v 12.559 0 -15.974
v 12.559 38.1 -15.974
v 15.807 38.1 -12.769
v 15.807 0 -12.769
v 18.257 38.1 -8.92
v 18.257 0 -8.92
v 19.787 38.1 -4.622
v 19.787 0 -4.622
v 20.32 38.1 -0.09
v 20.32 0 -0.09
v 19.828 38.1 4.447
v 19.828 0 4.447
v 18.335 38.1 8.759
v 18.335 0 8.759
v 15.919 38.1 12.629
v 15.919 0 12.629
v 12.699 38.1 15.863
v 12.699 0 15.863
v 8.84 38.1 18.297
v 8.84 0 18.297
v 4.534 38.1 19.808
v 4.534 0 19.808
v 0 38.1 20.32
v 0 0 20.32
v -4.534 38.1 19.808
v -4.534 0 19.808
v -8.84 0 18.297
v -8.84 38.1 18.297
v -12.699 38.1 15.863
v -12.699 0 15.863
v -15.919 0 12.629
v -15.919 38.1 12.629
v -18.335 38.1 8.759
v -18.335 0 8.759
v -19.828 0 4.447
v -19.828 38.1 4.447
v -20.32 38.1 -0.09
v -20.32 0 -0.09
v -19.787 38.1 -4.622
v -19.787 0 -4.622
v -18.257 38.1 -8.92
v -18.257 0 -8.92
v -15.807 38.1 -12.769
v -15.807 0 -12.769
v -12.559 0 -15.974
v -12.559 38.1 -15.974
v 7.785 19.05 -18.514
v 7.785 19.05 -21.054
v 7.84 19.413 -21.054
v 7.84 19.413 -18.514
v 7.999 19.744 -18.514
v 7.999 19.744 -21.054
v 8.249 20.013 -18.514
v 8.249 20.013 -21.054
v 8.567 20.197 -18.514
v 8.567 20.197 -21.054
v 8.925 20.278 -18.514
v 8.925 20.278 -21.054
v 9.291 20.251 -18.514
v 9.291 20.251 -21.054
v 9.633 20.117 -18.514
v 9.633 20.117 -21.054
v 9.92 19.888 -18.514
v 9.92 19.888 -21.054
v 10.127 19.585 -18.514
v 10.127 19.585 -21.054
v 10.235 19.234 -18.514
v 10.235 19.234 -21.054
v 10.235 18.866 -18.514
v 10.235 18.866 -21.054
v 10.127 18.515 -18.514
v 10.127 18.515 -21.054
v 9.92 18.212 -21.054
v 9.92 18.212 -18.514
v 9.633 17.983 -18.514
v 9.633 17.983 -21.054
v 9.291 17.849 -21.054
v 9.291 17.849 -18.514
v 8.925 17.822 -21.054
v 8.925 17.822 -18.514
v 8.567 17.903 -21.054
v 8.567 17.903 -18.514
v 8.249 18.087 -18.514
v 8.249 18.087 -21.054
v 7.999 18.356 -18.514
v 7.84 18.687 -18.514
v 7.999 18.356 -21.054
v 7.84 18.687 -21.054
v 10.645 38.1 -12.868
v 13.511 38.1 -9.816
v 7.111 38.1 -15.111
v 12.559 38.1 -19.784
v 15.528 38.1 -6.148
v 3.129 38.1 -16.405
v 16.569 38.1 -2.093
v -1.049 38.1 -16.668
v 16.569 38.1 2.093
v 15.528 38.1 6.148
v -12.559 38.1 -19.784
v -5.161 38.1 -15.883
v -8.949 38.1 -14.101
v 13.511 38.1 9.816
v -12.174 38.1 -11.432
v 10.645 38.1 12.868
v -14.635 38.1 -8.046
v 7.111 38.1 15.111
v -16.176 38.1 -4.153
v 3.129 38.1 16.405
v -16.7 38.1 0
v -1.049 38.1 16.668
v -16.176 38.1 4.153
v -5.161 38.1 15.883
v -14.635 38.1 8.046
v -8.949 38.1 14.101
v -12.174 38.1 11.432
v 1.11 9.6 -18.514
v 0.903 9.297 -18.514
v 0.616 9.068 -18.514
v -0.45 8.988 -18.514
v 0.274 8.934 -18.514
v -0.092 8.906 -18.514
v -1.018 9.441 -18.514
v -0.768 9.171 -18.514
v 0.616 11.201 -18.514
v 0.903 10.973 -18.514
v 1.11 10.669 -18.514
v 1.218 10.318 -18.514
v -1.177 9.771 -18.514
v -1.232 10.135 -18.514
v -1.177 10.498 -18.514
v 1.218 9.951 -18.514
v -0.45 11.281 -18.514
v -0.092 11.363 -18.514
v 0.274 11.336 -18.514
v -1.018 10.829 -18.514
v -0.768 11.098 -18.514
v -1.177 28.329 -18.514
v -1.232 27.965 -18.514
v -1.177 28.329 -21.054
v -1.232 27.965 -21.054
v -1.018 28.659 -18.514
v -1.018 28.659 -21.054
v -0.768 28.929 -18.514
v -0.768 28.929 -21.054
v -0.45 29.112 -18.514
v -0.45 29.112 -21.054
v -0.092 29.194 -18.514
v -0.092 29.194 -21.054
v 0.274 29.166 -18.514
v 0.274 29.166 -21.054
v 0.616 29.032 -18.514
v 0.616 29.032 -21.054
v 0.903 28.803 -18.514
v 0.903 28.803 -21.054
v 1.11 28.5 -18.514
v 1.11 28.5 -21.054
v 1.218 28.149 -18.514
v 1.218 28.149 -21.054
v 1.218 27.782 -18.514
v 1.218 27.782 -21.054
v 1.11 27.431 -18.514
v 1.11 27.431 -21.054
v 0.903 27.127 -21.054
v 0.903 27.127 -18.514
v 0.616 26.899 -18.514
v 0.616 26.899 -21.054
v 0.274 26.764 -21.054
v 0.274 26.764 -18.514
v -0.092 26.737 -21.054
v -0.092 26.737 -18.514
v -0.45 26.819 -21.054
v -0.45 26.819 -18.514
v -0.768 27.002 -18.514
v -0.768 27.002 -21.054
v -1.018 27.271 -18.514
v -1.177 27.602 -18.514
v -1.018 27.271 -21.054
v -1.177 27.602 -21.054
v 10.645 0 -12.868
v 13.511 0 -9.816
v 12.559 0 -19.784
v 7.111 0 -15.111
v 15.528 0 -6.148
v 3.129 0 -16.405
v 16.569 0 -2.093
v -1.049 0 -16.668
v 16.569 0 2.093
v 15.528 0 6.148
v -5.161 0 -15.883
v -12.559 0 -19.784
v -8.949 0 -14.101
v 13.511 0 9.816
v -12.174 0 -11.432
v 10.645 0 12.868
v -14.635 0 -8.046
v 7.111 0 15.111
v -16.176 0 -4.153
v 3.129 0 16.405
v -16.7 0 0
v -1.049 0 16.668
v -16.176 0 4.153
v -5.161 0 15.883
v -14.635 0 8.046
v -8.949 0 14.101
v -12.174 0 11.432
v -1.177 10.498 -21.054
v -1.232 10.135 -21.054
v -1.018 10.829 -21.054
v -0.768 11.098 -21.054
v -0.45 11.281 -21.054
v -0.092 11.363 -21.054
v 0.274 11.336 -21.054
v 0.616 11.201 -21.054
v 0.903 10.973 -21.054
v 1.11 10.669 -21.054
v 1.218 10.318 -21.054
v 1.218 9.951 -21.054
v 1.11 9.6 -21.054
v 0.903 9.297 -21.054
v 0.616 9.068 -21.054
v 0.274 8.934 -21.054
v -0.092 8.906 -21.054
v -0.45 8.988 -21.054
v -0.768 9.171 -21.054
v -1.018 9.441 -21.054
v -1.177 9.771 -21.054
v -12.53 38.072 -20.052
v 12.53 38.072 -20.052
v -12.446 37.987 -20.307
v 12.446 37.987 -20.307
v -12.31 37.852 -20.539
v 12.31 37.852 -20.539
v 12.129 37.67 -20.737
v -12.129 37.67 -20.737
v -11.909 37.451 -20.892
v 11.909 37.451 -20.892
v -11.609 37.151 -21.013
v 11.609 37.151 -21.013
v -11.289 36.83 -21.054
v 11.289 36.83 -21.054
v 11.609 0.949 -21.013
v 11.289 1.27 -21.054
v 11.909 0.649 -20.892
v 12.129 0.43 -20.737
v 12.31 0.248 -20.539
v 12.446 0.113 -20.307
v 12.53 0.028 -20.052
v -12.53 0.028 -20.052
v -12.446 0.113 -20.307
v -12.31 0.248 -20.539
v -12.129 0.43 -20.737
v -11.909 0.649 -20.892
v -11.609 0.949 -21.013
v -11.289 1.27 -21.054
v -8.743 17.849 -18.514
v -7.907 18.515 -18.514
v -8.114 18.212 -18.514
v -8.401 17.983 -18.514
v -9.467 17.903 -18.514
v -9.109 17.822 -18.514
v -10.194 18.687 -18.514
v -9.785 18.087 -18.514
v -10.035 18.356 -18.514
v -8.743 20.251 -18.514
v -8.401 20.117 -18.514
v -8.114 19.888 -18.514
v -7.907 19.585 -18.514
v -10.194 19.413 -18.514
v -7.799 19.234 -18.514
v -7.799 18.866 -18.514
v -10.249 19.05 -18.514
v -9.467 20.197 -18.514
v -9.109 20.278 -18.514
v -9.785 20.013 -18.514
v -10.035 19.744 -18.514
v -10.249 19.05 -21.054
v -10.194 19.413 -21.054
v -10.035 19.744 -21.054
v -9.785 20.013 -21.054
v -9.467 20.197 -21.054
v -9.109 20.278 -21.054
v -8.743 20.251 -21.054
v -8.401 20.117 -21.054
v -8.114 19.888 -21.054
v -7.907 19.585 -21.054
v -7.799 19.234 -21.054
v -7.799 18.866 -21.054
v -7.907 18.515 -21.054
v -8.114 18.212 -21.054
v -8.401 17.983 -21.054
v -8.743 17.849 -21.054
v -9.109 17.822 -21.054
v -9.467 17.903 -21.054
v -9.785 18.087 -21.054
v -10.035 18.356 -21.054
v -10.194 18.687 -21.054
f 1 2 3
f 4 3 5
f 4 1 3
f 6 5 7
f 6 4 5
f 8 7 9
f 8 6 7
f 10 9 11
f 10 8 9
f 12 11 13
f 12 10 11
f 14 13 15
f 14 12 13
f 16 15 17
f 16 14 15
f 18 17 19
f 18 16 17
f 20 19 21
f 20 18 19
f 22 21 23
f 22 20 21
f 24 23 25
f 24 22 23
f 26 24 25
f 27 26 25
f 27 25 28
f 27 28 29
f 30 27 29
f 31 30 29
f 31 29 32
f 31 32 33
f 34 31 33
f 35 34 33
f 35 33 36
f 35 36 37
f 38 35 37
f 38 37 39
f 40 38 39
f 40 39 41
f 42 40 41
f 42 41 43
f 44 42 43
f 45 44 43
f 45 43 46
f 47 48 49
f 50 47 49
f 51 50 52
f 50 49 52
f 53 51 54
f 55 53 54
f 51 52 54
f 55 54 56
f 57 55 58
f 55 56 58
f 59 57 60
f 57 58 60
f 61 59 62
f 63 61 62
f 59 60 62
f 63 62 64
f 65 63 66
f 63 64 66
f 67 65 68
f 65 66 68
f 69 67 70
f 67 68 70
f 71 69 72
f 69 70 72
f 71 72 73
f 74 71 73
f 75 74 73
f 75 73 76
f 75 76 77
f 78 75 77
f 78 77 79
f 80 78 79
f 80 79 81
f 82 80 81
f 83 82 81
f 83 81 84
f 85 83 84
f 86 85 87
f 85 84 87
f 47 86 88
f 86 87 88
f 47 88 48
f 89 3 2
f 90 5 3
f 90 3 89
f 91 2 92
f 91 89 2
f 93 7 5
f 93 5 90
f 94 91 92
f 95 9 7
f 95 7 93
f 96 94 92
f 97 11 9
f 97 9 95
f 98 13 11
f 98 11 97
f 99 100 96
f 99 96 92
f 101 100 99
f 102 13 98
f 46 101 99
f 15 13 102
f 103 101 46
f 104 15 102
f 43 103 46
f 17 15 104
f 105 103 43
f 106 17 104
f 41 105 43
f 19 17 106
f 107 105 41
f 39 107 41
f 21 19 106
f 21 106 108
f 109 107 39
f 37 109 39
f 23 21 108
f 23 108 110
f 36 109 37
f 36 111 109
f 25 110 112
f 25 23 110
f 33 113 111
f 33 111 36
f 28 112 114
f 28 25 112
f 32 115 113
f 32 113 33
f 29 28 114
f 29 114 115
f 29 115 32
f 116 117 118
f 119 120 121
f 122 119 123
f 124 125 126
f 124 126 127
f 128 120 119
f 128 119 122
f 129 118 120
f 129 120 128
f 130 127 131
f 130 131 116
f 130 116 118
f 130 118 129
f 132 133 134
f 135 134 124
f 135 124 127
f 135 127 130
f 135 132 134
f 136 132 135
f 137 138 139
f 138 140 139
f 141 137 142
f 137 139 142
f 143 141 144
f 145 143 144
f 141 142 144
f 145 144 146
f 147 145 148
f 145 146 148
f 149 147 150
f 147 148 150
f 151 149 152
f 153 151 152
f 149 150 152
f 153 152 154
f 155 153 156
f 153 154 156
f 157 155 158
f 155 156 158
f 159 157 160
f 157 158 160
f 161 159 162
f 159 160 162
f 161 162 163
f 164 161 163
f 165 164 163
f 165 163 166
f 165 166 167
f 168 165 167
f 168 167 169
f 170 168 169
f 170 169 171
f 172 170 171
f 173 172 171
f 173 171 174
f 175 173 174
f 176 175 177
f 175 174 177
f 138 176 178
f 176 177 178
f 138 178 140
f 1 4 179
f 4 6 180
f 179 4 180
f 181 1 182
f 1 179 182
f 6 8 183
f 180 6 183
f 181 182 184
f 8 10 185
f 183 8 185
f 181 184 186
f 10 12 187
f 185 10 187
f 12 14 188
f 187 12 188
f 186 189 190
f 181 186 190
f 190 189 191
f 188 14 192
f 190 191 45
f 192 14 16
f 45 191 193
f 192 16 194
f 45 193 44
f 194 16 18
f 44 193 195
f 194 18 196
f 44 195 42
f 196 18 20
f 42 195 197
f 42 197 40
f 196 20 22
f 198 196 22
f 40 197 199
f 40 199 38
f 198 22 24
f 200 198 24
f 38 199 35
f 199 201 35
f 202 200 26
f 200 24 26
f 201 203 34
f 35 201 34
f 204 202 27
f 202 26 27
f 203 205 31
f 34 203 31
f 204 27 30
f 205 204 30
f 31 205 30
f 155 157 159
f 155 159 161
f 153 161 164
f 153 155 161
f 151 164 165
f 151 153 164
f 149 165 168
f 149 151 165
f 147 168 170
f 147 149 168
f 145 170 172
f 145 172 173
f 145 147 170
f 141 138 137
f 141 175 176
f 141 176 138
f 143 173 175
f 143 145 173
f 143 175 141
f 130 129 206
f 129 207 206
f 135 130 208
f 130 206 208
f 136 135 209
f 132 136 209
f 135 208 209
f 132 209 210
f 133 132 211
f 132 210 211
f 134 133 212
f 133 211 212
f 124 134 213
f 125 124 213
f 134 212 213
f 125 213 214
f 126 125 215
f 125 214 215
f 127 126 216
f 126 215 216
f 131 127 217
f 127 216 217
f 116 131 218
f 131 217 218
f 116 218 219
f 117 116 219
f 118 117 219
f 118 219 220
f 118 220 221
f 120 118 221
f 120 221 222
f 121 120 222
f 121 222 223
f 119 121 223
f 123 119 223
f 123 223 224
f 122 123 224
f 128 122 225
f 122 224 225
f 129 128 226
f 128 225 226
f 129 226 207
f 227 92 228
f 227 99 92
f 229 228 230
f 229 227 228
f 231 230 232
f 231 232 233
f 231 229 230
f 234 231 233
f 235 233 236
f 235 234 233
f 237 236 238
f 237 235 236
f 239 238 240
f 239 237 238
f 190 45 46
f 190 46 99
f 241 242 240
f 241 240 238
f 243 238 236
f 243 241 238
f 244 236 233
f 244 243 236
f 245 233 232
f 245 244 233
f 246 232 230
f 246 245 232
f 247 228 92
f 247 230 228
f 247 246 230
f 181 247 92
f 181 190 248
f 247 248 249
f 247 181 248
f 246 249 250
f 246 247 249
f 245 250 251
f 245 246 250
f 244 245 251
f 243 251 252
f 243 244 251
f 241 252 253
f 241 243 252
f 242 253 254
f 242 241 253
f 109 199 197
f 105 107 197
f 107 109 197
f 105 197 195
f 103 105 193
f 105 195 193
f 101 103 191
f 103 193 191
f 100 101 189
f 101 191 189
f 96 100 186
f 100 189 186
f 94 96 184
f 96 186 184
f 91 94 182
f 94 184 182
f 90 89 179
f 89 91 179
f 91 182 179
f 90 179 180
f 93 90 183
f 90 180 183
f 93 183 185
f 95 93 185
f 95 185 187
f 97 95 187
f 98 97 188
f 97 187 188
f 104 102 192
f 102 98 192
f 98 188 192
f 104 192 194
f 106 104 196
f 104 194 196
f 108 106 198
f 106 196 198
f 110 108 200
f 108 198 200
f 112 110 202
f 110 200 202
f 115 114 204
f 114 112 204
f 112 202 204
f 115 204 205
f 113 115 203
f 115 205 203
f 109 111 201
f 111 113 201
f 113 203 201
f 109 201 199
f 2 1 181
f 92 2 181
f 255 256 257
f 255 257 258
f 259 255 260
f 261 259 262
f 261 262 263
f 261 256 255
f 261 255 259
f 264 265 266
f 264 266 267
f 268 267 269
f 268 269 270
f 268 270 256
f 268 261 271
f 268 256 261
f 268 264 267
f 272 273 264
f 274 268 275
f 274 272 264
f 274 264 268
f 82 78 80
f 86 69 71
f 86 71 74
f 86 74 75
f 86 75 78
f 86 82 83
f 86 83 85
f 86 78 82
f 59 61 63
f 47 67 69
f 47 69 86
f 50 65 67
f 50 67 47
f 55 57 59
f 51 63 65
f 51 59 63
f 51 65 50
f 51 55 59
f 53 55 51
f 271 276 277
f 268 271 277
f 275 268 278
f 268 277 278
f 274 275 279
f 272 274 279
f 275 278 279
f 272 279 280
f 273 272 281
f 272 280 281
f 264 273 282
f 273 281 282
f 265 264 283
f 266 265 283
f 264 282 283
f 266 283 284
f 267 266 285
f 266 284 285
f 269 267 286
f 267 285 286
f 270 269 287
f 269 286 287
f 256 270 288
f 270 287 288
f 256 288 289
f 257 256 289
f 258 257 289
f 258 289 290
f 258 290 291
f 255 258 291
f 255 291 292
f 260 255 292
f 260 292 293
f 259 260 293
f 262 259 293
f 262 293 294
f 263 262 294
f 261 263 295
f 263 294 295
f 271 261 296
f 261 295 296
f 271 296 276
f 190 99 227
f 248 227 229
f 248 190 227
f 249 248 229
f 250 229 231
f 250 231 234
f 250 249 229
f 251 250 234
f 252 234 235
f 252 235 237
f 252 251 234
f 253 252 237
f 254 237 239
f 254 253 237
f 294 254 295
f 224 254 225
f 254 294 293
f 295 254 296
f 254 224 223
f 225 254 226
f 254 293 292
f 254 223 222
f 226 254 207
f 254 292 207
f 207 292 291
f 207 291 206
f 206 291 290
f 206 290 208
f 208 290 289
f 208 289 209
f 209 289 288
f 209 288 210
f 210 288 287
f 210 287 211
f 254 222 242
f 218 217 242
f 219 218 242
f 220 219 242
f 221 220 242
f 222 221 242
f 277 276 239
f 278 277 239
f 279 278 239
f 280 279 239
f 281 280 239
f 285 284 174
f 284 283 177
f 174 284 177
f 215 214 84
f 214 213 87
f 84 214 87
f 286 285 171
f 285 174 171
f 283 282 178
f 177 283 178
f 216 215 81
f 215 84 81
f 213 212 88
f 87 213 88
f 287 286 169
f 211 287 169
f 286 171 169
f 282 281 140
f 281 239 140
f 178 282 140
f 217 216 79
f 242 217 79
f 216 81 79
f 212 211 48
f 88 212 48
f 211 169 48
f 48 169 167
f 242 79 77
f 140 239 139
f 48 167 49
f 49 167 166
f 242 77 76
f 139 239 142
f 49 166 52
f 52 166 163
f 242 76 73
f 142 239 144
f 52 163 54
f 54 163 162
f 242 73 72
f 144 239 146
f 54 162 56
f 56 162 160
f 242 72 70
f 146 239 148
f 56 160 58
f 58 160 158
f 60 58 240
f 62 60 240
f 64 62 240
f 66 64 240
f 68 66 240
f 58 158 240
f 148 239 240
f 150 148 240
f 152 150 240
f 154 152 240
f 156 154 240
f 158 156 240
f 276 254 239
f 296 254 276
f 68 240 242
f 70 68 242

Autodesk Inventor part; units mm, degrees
ref_plane "YZ Plane" through (0, 0, 0) normal (1, 0, 0) x (0, 1, 0)
ref_plane "XZ Plane" through (0, 0, 0) normal (0, 1, 0) x (-1, 0, 0)
ref_plane "XY Plane" through (0, 0, 0) normal (0, 0, 1) x (1, 0, 0)
sketch "Sketch1" plane through (0, 0, 0) normal (0, 1, 0) x (-1, 0, 0)
  circle A0 centre (0, 0) radius 16.7005
  circle A1 centre (0, 0) radius 20.32
  dimension "d1" = 33.401
  dimension "d2" = 40.64
extrude "Extrusion1" add sketch "Sketch1" along normal blind 38.1
sketch "Sketch2" plane through (0, 38.1, 0) normal (0, 1, 0) x (1, 0, 0)
  line L0 (0, 0) -> (0, 17.78) construction
  line L1 (0, 17.78) -> (-12.5588, 15.9743)
  circle A0 centre (0, 0) radius 20.32 projected
  line L2 (0, 17.78) -> (12.5588, 15.9743)
  line L3 (-12.5588, 15.9743) -> (-12.5588, 21.0543)
  line L4 (-12.5588, 21.0543) -> (0, 21.0543)
  line L5 (12.5588, 15.9743) -> (12.5588, 21.0543)
  line L6 (12.5588, 21.0543) -> (0, 21.0543)
  dimension "d5" = 17.78
  dimension "d6" = 5.08
extrude "Extrusion2" add sketch "Sketch2" against normal blind 38.1 contours L1 A0 L2 | L3 L4 L6 L5 A0 picked at (-7.0969, 17.3675)
sketch "Sketch3" plane through (12.5588, 38.1, -21.0543) normal (0, 0, -1) x (-1, 0, 0)
  circle A0 centre (21.5758, -19.05) radius 1.2319
  line L0 (25.1176, -38.1) -> (0, -38.1) projected
  line L1 (25.1176, 0) -> (25.1176, -38.1) projected
  line L2 (12.5588, -38.1) -> (12.5588, 17.1945) construction
  circle A1 centre (3.5418, -19.05) radius 1.2319
  circle A2 centre (12.5588, -27.9654) radius 1.2319
  circle A3 centre (12.5588, -10.1346) radius 1.2319
  line L3 (25.1176, 0) -> (0, 0) projected
  dimension "d9" = 2.4638
  dimension "d10" = 19.05
  dimension "d12" = 18.034
  dimension "d13" = 2.4638
  dimension "d14" = 2.4638
  dimension "d16" = 10.1346
  dimension "d17" = 10.1346
extrude "Extrusion3" cut sketch "Sketch3" against normal blind 2.54
fillet "Fillet1" radius 1.27 4 edges at (0, 0, -21.0543) (-12.5588, 19.05, -21.0543) (12.5588, 19.05, -21.0543) (0, 38.1, -21.0543)
properties part number "ROV Motor couppling"
